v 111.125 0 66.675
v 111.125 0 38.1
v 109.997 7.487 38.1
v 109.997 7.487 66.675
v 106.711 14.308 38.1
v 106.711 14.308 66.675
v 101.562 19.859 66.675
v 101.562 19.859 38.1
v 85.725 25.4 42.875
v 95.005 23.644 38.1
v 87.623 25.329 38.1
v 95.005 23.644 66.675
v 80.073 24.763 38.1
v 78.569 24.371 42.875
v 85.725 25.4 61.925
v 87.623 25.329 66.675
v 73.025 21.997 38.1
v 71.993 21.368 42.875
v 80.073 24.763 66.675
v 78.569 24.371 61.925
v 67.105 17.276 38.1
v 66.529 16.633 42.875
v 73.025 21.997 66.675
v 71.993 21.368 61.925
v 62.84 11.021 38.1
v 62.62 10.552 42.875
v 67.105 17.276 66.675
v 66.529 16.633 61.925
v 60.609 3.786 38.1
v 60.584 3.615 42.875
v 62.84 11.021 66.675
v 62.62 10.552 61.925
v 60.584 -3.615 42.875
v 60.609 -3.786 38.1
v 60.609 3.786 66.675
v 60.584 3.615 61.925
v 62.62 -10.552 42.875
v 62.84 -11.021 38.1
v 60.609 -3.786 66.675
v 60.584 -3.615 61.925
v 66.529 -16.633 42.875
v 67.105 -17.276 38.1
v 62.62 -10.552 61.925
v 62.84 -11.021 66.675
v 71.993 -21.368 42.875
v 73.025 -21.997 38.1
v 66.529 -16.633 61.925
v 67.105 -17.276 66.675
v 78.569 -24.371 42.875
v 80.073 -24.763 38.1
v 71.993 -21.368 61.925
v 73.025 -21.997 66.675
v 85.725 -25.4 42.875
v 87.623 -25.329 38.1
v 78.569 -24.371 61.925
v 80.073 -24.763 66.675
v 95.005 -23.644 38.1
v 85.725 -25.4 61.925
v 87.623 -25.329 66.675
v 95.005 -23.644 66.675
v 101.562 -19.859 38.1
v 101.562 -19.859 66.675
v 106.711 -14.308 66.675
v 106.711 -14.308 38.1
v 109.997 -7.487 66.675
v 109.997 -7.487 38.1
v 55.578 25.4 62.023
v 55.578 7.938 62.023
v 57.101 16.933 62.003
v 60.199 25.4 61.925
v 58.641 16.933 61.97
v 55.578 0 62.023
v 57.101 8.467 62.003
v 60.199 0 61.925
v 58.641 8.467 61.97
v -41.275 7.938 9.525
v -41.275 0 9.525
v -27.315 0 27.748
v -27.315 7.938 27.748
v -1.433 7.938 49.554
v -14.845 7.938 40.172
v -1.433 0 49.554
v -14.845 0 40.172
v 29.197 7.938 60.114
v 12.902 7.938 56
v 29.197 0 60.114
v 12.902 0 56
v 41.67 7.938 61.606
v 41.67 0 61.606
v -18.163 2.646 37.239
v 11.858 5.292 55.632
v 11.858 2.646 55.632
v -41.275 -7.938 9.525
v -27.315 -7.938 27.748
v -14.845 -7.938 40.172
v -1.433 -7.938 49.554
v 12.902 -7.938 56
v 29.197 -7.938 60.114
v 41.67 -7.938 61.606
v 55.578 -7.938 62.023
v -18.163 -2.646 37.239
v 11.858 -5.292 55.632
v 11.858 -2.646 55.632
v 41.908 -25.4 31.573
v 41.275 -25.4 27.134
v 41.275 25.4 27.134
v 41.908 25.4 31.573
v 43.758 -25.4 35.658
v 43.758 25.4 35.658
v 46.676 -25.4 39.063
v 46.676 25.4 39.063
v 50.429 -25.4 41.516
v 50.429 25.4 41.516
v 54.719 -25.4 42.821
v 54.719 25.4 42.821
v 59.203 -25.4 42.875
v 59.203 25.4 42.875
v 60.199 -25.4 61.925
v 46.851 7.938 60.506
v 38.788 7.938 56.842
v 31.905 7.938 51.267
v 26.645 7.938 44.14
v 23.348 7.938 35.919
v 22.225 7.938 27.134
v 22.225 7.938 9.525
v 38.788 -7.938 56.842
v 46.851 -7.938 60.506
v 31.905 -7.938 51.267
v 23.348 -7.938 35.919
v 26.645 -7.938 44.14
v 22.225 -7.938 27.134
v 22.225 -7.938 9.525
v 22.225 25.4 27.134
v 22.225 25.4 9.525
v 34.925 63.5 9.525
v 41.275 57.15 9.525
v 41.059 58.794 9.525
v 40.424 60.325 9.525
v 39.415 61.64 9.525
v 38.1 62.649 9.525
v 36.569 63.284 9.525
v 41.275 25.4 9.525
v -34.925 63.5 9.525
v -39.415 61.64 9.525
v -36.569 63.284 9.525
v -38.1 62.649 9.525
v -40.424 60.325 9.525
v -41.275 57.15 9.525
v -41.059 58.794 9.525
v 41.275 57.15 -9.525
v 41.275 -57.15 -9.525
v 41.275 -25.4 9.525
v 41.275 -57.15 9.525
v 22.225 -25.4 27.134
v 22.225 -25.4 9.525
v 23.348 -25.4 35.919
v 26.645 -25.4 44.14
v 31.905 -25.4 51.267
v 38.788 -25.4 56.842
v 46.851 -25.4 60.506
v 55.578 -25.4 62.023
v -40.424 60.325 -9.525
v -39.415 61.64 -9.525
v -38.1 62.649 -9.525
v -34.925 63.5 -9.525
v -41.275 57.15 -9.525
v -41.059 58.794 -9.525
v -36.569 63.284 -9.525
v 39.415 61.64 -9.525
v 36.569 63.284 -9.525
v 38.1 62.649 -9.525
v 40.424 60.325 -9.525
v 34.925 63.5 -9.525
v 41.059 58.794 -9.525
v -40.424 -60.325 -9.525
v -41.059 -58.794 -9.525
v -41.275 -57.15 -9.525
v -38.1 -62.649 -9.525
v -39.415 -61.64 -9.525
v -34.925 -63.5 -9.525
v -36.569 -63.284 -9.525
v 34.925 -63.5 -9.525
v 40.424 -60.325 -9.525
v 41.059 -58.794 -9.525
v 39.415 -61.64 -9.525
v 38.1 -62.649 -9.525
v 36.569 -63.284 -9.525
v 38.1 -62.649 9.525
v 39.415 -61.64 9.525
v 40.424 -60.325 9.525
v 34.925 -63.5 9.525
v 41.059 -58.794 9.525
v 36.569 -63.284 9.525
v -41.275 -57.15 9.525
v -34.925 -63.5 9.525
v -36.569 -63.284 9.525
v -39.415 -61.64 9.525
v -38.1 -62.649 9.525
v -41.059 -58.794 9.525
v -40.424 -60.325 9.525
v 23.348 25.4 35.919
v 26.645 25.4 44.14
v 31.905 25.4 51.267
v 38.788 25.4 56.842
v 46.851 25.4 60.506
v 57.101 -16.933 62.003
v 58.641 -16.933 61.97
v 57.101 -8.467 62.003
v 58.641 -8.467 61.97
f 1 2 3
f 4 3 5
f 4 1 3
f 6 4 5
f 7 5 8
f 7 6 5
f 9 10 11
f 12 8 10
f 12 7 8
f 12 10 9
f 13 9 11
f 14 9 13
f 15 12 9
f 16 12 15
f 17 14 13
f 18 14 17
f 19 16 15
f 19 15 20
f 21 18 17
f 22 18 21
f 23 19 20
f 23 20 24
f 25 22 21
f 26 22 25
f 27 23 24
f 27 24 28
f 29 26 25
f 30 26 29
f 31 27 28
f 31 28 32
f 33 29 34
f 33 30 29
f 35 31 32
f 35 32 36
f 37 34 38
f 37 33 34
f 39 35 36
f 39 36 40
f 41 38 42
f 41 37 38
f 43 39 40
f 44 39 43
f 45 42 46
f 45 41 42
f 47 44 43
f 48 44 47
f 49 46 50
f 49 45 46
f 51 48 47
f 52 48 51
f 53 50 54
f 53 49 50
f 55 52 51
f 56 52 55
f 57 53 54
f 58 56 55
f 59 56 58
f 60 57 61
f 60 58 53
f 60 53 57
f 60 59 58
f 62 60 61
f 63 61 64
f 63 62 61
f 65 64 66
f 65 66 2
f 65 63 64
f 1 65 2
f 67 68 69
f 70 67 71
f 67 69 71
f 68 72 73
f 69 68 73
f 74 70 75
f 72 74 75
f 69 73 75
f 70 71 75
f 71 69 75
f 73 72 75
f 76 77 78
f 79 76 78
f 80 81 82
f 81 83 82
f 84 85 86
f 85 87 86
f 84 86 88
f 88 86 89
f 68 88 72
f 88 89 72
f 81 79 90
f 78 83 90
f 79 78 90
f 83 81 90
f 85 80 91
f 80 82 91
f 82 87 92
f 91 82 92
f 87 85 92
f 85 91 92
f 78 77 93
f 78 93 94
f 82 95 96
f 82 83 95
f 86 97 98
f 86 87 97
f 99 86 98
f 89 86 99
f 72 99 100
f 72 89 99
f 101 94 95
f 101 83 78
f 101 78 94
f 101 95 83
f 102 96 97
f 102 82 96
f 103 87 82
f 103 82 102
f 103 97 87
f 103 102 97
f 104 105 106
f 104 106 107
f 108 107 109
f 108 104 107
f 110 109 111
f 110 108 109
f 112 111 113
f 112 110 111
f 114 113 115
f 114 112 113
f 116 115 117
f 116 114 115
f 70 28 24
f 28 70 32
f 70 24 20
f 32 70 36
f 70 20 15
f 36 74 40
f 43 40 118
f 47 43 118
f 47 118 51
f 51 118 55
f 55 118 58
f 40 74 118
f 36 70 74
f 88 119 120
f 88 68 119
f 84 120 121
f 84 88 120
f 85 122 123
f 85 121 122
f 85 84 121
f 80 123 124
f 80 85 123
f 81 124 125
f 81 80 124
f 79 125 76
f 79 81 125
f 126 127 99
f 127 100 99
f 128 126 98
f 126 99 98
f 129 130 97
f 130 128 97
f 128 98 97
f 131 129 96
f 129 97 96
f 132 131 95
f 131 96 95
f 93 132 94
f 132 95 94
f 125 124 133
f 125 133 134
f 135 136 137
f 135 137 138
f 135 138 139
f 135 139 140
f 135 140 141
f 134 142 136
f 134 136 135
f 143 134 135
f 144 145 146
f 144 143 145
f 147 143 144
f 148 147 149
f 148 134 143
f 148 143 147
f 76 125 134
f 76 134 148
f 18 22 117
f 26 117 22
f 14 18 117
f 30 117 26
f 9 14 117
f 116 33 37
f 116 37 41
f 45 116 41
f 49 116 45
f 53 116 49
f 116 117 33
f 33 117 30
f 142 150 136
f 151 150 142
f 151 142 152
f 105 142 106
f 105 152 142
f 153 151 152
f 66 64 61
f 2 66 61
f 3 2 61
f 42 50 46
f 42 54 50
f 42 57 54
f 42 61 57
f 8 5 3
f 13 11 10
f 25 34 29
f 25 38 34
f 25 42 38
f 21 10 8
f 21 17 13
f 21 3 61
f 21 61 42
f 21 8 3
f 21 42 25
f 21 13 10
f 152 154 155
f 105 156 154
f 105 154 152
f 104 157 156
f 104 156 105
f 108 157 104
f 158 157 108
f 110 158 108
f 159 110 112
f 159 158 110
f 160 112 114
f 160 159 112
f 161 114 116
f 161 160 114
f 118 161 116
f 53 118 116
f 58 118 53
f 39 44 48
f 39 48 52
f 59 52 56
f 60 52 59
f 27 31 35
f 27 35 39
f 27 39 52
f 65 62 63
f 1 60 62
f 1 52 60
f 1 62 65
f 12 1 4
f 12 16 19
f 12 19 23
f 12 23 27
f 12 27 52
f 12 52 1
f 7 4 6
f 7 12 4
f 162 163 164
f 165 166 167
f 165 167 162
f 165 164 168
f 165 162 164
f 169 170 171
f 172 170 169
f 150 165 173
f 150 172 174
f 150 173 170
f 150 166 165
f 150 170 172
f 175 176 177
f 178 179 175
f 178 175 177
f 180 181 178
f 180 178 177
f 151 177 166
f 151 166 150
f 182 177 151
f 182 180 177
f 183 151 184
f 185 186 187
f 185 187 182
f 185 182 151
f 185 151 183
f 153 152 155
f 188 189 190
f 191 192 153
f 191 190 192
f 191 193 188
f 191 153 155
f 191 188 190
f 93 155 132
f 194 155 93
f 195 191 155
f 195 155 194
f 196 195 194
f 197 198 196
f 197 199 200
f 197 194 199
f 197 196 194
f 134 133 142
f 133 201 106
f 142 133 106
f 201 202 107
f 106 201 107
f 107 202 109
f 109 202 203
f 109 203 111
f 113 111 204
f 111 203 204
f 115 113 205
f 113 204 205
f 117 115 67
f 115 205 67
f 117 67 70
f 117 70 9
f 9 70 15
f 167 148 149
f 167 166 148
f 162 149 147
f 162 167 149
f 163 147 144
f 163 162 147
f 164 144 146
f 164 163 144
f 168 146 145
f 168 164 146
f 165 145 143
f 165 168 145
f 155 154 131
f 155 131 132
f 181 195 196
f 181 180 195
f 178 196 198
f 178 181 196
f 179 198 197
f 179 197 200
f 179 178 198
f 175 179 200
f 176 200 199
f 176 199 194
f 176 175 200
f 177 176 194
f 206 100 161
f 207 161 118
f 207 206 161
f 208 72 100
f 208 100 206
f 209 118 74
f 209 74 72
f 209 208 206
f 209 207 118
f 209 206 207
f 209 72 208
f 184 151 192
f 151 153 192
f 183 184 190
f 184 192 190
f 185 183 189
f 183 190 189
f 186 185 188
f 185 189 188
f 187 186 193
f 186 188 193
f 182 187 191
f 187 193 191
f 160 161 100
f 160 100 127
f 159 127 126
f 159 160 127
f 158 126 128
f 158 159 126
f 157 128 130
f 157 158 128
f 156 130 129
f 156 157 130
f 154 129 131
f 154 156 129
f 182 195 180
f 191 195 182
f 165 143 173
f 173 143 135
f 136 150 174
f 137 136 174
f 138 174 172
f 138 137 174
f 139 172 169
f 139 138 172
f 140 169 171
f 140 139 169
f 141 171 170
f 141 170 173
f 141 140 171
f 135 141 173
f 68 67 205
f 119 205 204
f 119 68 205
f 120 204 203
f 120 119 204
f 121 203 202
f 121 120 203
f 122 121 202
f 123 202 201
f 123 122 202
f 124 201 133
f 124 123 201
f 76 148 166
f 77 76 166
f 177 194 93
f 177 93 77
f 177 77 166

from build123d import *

# Parameters (mm, degrees)
F1_DEPTH = 63.5
F2_DEPTH = 25.4
F3_DEPTH = 7.9375
F0_W     = 25.4
F0_H     = 19.05
F4_DEPTH = 25.4
F6_R     = 6.35


with BuildPart() as f1:
    # F0 (on Front) → F1 (new body, symmetric)
    with BuildSketch(Plane.XZ):
        Polygon((22.225, 9.525), (-41.275, 9.525), (-41.275, -9.525), (41.275, -9.525), (41.275, 9.525), align=None)
    extrude(amount=F1_DEPTH, both=True)

    # F0 (on Front) → F2 (join, symmetric)
    with BuildSketch(Plane.XZ):
        with BuildLine():
            Line((22.225, 27.1335136465), (22.225, 9.525))
            Line((22.225, 9.525), (41.275, 9.525))
            Line((41.275, 9.525), (41.275, 27.1335136465))
            ThreePointArc((41.275, 27.1335136465), (46.6756561073, 39.0626269839), (59.2030308685, 42.8752))
            Line((59.2030308685, 42.8752), (60.325, 42.8752))
            Line((60.325, 42.8752), (60.325, 61.9252))
            Line((60.325, 61.9252), (60.1986366915, 61.9252))
            add(Edge.make_bspline(
                [(55.5778495322, 62.02311049), (57.0926075375, 62.0086737376), (58.6326298587, 61.9761317105), (60.1986366915, 61.9252)],
                knots=[111.0214759669, 111.0214759669, 111.0214759669, 111.0214759669, 114.2045529016, 114.2045529016, 114.2045529016, 114.2045529016], degree=3))
            ThreePointArc((55.5778495322, 62.02311049), (31.904574869, 51.2669786889), (22.225, 27.1335136465))
        make_face()
    extrude(amount=F2_DEPTH, both=True)

    # F0 (on Front) → F3 (join, symmetric)
    with BuildSketch(Plane.XZ):
        with BuildLine():
            add(Edge.make_bspline(
                [(-41.275, 9.525), (-19.3530475972, 41.0047273115), (2.745111609, 62.5266451514), (55.5778495322, 62.02311049)],
                knots=[0, 0, 0, 0, 111.0214759669, 111.0214759669, 111.0214759669, 111.0214759669], degree=3))
            Line((-41.275, 9.525), (22.225, 9.525))
            Line((22.225, 9.525), (22.225, 27.1335136465))
            ThreePointArc((22.225, 27.1335136465), (31.904574869, 51.2669786889), (55.5778495322, 62.02311049))
        make_face()
    extrude(amount=F3_DEPTH, both=True)

    # F0 (on Front) → F4 (join, symmetric)
    with BuildSketch(Plane.XZ):
        with Locations((73.025, 52.4002)):
            Rectangle(F0_W, F0_H)
    extrude(amount=F4_DEPTH, both=True)

    # F0 (on Front) → F5 (revolve)
    with BuildSketch(Plane.XZ):
        Polygon((85.725, 66.675), (85.725, 61.9252), (85.725, 42.8752), (85.725, 38.1), (111.125, 38.1), (111.125, 66.675), align=None)
    revolve(axis=Axis((85.725, 0, 52.3875), (0, 0, 1)))

    # F6
    f6_edges = [f1.edges().sort_by_distance(p)[0] for p in [
        (-41.275, -63.5, 0),
        (41.275, -63.5, 0),
        (-41.275, 63.5, 0),
        (41.275, 63.5, 0),
    ]]
    fillet(f6_edges, radius=F6_R)


solid = f1.part
